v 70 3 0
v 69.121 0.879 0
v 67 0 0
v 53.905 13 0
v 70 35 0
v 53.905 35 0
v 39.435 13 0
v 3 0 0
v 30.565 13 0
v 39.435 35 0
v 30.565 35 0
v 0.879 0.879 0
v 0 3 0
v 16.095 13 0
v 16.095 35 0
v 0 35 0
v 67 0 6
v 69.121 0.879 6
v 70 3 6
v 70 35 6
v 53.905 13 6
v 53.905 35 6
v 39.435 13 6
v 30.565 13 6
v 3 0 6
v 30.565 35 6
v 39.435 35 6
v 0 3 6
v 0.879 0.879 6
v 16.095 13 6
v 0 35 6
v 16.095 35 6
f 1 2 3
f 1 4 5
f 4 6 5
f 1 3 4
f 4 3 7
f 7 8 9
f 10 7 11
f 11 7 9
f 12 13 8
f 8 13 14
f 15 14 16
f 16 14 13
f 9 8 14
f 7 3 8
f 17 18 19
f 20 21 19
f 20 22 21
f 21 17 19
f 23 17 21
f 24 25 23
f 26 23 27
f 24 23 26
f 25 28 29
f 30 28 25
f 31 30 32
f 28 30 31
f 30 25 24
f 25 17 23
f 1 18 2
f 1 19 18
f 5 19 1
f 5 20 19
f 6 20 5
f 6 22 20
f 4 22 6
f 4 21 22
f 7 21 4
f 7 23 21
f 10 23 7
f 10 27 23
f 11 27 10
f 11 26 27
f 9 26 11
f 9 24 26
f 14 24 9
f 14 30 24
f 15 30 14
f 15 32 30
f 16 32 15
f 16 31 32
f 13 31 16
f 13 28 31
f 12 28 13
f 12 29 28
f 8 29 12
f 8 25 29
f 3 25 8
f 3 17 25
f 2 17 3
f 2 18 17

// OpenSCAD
$fn = 32;

// ----------------------------------------------------------------------
// Window plate: 70 x 35 mm, 2 open windows
// ----------------------------------------------------------------------

// --- parameters (mm) ---
profile_height = 6;       // extrusion height
profile_points = 16;      // points of the closed outline

profile = [[0, 3], [0.879, 0.879], [3, 0], [67, 0], [69.121, 0.879], [70, 3], [70, 35], [53.905, 35], [53.905, 13], [39.435, 13], [39.435, 35], [30.565, 35], [30.565, 13], [16.095, 13], [16.095, 35], [0, 35]];  // single closed polygon, 16 points, counter clockwise

// --- the one profile operation ---
linear_extrude(height = profile_height) polygon(points = profile);
